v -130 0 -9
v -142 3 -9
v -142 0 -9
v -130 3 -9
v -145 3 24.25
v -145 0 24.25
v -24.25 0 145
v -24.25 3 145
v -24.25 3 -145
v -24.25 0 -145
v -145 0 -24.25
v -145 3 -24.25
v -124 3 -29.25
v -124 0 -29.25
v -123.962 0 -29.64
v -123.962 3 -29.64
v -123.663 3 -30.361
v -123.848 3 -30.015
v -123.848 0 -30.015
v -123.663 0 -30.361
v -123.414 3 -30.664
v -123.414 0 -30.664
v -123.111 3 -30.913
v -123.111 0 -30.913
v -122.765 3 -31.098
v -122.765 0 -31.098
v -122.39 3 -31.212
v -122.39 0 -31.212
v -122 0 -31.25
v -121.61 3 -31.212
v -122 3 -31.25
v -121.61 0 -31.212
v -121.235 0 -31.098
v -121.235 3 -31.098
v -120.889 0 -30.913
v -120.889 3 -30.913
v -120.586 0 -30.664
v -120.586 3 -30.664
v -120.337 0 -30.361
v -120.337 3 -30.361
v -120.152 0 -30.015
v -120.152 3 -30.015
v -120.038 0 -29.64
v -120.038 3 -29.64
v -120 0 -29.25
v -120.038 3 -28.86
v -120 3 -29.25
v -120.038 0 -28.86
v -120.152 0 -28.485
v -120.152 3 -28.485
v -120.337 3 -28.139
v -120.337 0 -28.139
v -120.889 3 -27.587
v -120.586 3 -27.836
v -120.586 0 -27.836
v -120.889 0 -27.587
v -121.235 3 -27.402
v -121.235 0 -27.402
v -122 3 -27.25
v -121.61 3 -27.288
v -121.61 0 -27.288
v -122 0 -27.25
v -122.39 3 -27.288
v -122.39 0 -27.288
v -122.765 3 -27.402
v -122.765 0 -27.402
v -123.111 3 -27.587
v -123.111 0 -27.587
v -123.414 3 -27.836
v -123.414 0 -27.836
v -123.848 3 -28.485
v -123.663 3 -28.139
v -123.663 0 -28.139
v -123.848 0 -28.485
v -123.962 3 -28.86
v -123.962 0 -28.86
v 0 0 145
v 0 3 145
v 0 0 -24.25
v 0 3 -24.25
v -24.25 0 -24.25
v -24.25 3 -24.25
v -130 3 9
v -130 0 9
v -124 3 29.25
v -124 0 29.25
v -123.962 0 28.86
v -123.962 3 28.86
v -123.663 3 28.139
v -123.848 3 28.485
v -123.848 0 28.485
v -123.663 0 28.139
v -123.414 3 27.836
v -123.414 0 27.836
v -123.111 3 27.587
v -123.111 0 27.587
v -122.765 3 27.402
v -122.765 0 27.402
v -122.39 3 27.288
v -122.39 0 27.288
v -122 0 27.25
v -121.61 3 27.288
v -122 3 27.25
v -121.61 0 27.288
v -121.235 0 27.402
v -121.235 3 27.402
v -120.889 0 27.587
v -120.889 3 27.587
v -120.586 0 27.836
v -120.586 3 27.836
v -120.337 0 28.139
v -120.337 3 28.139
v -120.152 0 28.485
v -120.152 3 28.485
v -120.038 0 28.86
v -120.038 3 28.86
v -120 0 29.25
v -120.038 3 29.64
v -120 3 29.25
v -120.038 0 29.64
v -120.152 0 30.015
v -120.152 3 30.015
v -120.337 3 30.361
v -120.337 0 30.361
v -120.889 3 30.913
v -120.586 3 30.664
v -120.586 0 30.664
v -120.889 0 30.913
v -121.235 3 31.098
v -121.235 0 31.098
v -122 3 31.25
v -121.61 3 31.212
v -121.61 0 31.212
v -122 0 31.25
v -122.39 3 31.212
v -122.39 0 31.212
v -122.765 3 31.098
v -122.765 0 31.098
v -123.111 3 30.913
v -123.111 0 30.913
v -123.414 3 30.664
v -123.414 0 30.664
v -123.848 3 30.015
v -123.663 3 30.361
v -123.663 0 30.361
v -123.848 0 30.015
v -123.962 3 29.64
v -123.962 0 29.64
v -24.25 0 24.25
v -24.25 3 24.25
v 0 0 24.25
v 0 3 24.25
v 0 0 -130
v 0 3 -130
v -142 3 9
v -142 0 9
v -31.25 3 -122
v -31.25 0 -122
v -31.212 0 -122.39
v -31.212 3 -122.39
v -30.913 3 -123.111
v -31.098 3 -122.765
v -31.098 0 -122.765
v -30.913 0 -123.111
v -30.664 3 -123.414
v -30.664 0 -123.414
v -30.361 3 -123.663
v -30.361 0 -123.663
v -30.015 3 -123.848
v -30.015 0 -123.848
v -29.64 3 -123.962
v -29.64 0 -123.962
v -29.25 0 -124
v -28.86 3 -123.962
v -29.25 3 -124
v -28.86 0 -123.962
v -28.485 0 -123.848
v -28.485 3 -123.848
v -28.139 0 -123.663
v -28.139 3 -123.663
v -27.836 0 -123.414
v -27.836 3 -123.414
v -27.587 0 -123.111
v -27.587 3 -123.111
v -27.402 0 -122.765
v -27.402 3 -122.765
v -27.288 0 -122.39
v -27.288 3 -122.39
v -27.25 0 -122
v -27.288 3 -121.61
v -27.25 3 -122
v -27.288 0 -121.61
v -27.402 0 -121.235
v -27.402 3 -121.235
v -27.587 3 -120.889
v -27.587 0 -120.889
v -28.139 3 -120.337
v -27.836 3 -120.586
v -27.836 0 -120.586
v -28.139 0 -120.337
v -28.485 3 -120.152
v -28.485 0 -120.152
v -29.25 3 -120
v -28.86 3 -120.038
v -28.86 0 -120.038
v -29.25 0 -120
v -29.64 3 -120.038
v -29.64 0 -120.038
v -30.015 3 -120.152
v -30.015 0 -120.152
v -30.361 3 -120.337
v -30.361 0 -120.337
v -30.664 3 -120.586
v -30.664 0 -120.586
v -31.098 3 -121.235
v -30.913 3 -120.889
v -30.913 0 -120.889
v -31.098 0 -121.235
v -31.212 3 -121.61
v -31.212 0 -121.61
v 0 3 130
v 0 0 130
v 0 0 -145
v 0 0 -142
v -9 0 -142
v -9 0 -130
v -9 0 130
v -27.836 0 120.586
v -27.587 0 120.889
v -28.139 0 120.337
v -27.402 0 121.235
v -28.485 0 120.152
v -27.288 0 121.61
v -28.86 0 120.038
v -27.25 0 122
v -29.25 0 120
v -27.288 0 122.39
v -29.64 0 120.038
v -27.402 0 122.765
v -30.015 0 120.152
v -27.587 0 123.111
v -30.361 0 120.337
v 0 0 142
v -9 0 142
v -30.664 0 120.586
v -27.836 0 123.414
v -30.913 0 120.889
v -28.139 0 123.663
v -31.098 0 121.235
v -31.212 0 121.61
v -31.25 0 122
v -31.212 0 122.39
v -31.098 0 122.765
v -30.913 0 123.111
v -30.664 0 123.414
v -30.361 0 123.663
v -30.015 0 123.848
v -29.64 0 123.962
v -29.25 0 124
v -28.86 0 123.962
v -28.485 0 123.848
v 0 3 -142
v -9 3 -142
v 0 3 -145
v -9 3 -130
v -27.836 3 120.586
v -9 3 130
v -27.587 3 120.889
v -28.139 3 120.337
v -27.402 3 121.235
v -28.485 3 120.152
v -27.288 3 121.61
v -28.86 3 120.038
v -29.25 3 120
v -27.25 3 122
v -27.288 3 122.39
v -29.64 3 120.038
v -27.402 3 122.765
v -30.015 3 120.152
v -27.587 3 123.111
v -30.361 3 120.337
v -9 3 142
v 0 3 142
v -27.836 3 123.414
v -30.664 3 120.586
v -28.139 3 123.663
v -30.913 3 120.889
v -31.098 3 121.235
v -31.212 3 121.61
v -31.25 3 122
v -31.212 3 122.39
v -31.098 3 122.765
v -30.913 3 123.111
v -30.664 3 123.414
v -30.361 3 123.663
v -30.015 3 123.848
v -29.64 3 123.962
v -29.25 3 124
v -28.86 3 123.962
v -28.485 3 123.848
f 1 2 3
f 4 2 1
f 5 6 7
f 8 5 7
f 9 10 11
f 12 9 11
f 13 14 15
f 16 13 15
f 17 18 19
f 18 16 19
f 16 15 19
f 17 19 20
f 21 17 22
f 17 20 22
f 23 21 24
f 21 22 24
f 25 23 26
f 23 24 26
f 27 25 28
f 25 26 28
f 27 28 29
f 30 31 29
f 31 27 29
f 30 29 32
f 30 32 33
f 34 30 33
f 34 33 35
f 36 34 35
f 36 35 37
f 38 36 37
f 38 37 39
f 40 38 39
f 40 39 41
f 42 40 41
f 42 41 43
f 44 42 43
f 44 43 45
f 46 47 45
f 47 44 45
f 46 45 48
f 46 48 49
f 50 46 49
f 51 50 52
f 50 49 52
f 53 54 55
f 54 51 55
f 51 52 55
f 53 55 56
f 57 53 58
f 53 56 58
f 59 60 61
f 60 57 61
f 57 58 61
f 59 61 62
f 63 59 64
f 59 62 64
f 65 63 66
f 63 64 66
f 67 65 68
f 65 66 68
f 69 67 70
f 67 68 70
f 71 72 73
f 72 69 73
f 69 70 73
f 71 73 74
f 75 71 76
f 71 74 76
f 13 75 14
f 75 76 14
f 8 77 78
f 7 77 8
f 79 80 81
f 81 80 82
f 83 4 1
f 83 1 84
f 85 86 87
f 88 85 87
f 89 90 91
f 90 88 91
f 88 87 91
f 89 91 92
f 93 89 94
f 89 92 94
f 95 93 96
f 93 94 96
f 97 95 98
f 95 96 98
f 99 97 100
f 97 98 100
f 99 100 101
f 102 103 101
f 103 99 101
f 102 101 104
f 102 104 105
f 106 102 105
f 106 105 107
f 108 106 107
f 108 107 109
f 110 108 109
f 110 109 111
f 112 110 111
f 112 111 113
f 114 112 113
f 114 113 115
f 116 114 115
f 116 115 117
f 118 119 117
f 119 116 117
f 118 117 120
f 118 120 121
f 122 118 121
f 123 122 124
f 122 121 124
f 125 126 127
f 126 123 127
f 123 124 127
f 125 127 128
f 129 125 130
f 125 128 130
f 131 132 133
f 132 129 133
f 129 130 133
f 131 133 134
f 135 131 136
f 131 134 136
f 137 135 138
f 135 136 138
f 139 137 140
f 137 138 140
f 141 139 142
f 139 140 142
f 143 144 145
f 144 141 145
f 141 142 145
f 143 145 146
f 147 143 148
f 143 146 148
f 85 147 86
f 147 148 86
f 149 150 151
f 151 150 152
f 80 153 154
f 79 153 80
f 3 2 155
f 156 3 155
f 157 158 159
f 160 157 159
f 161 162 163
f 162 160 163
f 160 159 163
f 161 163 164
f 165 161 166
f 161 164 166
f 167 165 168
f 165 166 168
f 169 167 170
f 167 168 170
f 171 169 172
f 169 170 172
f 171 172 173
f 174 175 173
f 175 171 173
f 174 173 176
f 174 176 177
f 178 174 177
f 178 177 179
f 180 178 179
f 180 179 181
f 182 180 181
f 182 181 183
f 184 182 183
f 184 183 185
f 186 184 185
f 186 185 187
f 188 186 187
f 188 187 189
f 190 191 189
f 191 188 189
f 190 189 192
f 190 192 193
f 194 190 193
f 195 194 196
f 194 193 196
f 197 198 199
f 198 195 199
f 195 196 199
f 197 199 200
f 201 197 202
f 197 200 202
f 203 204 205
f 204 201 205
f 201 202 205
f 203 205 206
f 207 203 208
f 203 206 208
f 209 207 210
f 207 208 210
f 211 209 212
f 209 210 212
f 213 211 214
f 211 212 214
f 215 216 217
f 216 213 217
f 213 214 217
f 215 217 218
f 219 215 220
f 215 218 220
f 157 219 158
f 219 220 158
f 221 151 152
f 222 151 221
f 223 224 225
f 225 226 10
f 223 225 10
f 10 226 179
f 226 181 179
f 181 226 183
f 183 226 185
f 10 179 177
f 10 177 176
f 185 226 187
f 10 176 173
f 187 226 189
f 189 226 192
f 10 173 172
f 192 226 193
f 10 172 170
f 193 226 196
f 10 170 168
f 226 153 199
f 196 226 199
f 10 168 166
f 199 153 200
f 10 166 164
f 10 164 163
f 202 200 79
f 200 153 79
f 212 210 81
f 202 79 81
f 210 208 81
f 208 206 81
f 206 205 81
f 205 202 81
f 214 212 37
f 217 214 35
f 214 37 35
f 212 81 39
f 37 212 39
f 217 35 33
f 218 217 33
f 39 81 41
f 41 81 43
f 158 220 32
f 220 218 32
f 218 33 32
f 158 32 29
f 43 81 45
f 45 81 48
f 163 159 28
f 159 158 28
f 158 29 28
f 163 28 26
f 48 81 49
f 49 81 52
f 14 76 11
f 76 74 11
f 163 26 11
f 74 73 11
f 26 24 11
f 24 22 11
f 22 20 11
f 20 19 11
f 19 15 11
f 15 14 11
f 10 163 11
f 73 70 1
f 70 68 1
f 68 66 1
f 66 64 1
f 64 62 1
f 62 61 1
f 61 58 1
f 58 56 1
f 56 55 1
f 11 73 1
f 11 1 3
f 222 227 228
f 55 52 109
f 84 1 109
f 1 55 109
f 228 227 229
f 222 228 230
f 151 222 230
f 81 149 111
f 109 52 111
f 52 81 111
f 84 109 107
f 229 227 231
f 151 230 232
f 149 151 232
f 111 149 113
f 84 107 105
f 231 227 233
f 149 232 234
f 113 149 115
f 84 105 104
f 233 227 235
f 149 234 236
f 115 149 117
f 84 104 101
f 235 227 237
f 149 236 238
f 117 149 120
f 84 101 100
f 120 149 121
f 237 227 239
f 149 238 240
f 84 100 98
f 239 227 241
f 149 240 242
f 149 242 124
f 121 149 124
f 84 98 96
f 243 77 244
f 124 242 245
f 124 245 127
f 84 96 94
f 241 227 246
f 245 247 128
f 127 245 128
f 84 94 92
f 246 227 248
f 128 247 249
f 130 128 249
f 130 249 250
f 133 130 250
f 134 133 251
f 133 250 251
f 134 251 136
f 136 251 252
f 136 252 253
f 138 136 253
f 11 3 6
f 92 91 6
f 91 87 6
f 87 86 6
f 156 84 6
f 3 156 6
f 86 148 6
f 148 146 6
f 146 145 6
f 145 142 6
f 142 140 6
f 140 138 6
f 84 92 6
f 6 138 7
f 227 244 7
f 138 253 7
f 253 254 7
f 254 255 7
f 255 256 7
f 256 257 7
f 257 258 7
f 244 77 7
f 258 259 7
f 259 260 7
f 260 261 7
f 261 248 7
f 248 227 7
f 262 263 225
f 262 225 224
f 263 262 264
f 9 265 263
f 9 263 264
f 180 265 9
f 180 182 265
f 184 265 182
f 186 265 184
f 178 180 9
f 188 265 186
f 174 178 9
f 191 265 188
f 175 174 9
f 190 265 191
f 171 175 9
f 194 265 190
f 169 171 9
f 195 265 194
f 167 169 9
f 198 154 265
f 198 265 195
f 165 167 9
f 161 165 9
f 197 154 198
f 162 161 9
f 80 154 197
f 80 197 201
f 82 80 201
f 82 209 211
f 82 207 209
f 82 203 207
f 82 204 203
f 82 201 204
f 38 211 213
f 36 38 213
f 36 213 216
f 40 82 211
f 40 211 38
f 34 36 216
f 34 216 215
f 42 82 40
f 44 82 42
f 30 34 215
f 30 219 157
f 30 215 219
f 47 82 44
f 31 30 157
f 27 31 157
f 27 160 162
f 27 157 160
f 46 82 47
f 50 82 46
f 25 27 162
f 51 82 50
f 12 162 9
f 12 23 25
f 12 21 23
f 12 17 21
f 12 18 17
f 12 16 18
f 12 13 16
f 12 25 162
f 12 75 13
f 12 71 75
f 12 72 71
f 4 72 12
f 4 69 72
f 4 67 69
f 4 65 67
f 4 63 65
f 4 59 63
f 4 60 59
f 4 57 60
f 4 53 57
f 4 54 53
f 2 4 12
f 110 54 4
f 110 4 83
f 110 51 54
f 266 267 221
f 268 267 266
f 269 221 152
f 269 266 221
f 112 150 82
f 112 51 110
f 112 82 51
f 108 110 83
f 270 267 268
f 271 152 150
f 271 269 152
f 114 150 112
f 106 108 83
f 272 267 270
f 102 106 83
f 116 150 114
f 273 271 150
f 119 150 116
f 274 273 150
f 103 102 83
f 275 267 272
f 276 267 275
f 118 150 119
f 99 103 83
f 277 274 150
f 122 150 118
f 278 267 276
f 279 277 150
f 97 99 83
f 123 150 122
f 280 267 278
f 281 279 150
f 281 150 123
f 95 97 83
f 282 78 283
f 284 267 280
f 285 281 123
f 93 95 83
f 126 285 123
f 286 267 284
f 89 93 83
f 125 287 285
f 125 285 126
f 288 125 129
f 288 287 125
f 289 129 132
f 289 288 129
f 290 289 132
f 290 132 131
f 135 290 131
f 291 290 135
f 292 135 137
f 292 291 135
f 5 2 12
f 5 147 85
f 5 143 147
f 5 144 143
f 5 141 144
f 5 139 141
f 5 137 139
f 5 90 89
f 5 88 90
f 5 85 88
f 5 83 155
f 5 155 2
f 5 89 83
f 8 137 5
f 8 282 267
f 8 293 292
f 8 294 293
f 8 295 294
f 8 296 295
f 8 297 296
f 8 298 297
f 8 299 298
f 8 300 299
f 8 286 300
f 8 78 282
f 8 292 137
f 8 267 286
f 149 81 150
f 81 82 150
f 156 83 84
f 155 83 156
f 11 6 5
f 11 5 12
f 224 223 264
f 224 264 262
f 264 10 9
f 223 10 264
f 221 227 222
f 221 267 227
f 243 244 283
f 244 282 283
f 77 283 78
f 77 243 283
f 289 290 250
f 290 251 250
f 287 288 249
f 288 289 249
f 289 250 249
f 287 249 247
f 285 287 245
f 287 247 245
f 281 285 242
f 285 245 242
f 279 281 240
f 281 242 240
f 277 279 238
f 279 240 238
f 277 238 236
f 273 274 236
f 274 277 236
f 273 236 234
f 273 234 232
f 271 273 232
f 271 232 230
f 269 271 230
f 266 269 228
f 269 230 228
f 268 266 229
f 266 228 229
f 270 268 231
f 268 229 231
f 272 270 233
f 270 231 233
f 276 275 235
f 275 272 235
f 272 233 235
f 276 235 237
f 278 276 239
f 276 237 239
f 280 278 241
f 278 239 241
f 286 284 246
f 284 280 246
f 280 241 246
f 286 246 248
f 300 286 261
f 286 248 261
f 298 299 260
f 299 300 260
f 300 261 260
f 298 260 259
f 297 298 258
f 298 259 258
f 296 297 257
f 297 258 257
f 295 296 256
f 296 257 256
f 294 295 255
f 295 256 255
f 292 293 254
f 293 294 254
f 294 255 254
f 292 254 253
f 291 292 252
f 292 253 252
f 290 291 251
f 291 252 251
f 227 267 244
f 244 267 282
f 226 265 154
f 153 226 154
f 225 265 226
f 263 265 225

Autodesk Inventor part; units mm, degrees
ref_plane "YZ Plane" through (0, 0, 0) normal (1, 0, 0) x (0, 1, 0)
ref_plane "XZ Plane" through (0, 0, 0) normal (0, 1, 0) x (-1, 0, 0)
ref_plane "XY Plane" through (0, 0, 0) normal (0, 0, 1) x (1, 0, 0)
sketch "Boceto1" plane through (0, 0, 0) normal (0, 1, 0) x (-1, 0, 0)
  line L0 (0, 145) -> (24.25, 145)
  line L1 (145, 24.25) -> (145, -24.25)
  line L2 (145, 24.25) -> (24.25, 145)
  line L3 (24.25, -145) -> (145, -24.25)
  line L4 (24.25, -145) -> (0, -145)
  circle A0 centre (29.25, -122) radius 2
  circle A1 centre (122, -29.25) radius 2
  circle A2 centre (122, 29.25) radius 2
  circle A3 centre (29.25, 122) radius 2
  line L5 (0, -145) -> (0, 145)
  point P0 (0, 0)
  dimension "d13" = 4
  dimension "d16" = 4
  dimension "d18" = 4
  dimension "d20" = 4
extrude "Extrusión1" add sketch "Boceto1" along normal blind 3
sketch "Boceto5" plane through (0, 3, 0) normal (0, 1, 0) x (1, 0, 0)
  line L0 (-142, 9) -> (-130, 9)
  line L1 (-130, 9) -> (-130, -9)
  line L2 (-130, -9) -> (-142, -9)
  line L3 (-9, -130) -> (-9, -142)
  line L4 (-9, 130) -> (-9, 142)
  line L5 (-142, 9) -> (-142, -9)
  line L6 (-9, -130) -> (0, -130)
  line L7 (-9, -142) -> (0, -142)
  line L8 (0, -130) -> (0, -142)
  line L9 (0, -145) -> (0, 145) projected
  line L10 (-9, 142) -> (0, 142)
  line L11 (0, 130) -> (0, 142)
  line L12 (-9, 130) -> (0, 130)
extrude "Extrusión5" cut sketch "Boceto5" against normal blind 3
sketch "Boceto8" plane through (0, 3, 0) normal (0, 1, 0) x (1, 0, 0)
  line L0 (0, 24.25) -> (-24.25, 24.25)
  line L1 (0, -24.25) -> (0, 24.25)
  line L2 (-24.25, 24.25) -> (-24.25, -24.25)
  line L3 (-24.25, -24.25) -> (0, -24.25)
extrude "Extrusión8" cut sketch "Boceto8" against normal blind 3
properties part number "_3DPrint"
